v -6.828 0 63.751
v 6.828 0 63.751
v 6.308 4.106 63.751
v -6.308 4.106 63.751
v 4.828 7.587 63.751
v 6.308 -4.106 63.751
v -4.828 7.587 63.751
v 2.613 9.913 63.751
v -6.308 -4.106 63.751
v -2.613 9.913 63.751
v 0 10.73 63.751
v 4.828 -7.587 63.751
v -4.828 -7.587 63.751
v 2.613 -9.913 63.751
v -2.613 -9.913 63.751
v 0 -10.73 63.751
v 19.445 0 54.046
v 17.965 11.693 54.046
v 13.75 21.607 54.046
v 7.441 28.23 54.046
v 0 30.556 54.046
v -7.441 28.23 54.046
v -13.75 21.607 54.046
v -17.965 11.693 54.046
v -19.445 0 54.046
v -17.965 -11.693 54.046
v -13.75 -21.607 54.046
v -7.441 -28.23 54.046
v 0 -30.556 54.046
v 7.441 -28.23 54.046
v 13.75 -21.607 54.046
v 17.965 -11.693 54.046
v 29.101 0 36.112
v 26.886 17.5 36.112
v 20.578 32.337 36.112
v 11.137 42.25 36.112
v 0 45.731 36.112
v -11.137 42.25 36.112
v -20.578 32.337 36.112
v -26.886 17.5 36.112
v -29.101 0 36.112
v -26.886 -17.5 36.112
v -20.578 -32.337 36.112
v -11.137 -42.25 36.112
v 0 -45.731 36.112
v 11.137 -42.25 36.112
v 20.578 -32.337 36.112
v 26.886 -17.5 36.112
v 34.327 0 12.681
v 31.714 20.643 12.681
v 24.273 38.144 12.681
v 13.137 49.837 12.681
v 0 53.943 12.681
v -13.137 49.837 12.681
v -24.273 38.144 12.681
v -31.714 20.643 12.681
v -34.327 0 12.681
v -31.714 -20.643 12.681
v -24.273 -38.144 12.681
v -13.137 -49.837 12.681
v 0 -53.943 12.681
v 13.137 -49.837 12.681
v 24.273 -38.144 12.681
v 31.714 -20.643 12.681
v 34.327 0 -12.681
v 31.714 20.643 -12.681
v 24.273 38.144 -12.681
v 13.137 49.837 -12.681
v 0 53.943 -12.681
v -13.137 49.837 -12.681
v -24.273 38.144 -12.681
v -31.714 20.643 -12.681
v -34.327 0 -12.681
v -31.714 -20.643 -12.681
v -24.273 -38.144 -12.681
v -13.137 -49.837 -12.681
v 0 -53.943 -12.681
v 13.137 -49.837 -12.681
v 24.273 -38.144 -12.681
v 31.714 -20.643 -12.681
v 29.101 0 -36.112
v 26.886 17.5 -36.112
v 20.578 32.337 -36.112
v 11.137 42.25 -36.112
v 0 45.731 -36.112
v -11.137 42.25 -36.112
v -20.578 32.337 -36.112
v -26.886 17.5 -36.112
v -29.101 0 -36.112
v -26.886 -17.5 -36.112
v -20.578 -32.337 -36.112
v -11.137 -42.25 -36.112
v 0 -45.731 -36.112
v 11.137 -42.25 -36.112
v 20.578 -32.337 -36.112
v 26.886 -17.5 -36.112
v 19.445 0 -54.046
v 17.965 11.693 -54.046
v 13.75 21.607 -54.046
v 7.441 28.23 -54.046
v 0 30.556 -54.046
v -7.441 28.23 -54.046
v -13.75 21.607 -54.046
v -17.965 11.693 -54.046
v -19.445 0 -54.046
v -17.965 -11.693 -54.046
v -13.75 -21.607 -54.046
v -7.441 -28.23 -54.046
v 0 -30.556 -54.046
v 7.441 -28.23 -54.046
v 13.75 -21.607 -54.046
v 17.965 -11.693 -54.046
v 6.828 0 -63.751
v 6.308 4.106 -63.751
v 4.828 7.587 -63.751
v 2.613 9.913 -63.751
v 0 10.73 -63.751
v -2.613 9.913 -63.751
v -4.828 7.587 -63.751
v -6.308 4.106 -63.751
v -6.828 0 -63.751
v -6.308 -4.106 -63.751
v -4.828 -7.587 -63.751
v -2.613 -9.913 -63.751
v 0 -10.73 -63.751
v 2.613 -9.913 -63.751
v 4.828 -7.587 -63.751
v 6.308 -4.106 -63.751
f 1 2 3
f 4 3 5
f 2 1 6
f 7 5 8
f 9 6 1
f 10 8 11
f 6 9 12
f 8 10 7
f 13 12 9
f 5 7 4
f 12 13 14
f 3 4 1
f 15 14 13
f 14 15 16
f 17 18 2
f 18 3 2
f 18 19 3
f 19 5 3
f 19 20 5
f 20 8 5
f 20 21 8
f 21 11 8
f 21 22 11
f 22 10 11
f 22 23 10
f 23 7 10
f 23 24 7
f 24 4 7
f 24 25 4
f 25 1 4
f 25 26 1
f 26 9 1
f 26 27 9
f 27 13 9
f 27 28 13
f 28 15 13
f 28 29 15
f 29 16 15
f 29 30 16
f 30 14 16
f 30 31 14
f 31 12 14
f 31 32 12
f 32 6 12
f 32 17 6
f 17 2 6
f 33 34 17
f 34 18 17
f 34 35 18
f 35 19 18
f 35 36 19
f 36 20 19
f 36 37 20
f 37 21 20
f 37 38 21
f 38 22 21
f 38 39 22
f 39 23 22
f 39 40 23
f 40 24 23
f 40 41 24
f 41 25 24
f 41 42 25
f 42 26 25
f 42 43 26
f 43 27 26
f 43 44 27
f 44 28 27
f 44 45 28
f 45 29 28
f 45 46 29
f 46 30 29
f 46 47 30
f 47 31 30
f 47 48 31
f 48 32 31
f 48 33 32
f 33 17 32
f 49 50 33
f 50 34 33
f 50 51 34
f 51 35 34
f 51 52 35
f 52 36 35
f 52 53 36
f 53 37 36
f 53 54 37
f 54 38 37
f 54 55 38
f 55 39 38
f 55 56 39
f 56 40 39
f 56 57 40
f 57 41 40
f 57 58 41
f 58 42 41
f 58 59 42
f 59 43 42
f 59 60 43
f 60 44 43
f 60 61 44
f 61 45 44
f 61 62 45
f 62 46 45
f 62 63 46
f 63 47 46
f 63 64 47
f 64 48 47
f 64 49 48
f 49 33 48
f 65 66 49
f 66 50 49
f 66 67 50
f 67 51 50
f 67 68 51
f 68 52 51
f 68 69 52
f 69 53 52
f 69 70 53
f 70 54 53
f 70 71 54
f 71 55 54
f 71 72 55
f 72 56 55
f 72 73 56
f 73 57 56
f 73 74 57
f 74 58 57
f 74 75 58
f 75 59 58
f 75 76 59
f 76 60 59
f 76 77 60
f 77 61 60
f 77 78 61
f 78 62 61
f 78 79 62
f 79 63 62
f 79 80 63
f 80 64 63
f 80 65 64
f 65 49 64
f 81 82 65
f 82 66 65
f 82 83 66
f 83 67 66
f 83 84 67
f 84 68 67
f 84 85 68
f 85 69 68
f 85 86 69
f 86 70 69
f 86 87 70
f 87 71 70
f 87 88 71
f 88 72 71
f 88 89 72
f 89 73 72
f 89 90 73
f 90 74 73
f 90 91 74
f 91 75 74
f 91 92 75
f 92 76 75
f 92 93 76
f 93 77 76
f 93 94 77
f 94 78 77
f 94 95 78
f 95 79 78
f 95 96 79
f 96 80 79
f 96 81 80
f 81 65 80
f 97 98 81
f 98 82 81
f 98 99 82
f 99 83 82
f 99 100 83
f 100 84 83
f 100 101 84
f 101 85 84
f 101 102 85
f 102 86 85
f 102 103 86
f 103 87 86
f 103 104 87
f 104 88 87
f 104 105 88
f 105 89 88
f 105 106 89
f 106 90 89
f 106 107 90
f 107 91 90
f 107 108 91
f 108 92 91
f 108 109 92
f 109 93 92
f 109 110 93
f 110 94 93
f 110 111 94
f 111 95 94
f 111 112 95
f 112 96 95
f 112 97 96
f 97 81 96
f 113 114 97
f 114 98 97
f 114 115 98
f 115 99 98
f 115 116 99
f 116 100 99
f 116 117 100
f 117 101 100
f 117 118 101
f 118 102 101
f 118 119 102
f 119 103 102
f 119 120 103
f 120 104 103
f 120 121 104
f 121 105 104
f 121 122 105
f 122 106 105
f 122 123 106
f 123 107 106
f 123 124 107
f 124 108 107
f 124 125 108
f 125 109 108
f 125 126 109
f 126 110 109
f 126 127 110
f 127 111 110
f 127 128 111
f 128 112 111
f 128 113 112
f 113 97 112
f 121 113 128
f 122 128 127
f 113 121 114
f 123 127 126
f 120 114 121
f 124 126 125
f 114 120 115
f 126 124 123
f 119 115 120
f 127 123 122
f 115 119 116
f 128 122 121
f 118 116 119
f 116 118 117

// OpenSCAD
// Generated by SolidPython 1.0.1 on 2020-07-29 00:46:47


scale(v = [7, 11, 13]) {
	sphere(r = 5);
}
/***********************************************
*********      SolidPython code:      **********
************************************************
 
# import packages: SolidPython
from solid import *
from solid.utils import *
from itertools import chain, combinations, permutations


class Resize:

    def __init__(self, scad_file):
        self.scad_file = scad_file
        #self.scad_file = import_scad(scad_file)
        # cone/cylinder param:
        self.r1 = 0
        self.r2 = 0
        self.h = 0
        # rectangular prism param:
        self.w = 0
        self.l = 0
        # ellipse param:
        self.r = 0

    # import OpenScad code (file name corresponds to shape)


    # classify shape + parameters
    def assign(self, param1, param2, param3):
        if self.scad_file == 'cone.scad':
            self.r1 = param1
            self.r2 = param2
            self.h = param3
        elif self.scad_file == 'cylinder.scad':
            self.r1 = param1
            self.r2 = param2
            self.h = param3
        elif self.scad_file == 'rectangularPrism.scad':
            self.h = param1
            self.l = param2
            self.w = param3
        else:
            self.r = param1
            self.h = param2

    # resize parameters
    def iterate(self):
        x = range(3, 20, 2)
        i = 1
        if self.scad_file == 'cone.scad':
            tempList = list(permutations(x, 2))
            for temp in tempList:
                param1 = temp[0]
                param2 = temp[1]
                filepath = 'produced_scad_files/' + 'cone' + str(param1) + '_' + str(param2) + '_' + '.scad'
                scad_render_to_file(cylinder(h=param1, r1=param2, r2=0), filepath)

        elif self.scad_file == 'cylinder.scad':
            tempList = list(permutations(x, 3))
            for temp in tempList:
                param1 = temp[0]
                param2 = temp[1]
                filepath = 'produced_scad_files/' + 'cylinder' + str(param1) + '_' + str(param2) + '_' + '.scad'
                scad_render_to_file(cylinder(h=param1, r1=param2, r2=param2), filepath)

        elif self.scad_file == 'rectangularPrism.scad':
            tempList = list(permutations(x, 3))
            for temp in tempList:
                param1 = temp[0]
                param2 = temp[1]
                param3 = temp[2]
                filepath = 'produced_scad_files/' + 'rectangularPrism' + str(param1) + '_' + str(param2) + '_' + str(
                    param3) + '.scad'
                scad_render_to_file(cube(size=(param1, param2, param3)), filepath)

        elif self.scad_file == 'ellipse.scad':
            tempList = list(permutations(x, 4))
            for temp in tempList:
                param1 = temp[0]
                param2 = temp[1]
                param3 = temp[2]
                param4 = temp[3]
                filepath = 'produced_scad_files/' + 'ellipse' + str(param1) + '_' + str(param2) + '_' + str(param3) + '_' + str(param4) + '.scad'
                scad_render_to_file(scale([param1, param2, param3])(sphere(r=param4)), filepath)

    def render_to_scadfile(self):
        scad_render_to_file(scad, 'example.scad') 
 
************************************************/
